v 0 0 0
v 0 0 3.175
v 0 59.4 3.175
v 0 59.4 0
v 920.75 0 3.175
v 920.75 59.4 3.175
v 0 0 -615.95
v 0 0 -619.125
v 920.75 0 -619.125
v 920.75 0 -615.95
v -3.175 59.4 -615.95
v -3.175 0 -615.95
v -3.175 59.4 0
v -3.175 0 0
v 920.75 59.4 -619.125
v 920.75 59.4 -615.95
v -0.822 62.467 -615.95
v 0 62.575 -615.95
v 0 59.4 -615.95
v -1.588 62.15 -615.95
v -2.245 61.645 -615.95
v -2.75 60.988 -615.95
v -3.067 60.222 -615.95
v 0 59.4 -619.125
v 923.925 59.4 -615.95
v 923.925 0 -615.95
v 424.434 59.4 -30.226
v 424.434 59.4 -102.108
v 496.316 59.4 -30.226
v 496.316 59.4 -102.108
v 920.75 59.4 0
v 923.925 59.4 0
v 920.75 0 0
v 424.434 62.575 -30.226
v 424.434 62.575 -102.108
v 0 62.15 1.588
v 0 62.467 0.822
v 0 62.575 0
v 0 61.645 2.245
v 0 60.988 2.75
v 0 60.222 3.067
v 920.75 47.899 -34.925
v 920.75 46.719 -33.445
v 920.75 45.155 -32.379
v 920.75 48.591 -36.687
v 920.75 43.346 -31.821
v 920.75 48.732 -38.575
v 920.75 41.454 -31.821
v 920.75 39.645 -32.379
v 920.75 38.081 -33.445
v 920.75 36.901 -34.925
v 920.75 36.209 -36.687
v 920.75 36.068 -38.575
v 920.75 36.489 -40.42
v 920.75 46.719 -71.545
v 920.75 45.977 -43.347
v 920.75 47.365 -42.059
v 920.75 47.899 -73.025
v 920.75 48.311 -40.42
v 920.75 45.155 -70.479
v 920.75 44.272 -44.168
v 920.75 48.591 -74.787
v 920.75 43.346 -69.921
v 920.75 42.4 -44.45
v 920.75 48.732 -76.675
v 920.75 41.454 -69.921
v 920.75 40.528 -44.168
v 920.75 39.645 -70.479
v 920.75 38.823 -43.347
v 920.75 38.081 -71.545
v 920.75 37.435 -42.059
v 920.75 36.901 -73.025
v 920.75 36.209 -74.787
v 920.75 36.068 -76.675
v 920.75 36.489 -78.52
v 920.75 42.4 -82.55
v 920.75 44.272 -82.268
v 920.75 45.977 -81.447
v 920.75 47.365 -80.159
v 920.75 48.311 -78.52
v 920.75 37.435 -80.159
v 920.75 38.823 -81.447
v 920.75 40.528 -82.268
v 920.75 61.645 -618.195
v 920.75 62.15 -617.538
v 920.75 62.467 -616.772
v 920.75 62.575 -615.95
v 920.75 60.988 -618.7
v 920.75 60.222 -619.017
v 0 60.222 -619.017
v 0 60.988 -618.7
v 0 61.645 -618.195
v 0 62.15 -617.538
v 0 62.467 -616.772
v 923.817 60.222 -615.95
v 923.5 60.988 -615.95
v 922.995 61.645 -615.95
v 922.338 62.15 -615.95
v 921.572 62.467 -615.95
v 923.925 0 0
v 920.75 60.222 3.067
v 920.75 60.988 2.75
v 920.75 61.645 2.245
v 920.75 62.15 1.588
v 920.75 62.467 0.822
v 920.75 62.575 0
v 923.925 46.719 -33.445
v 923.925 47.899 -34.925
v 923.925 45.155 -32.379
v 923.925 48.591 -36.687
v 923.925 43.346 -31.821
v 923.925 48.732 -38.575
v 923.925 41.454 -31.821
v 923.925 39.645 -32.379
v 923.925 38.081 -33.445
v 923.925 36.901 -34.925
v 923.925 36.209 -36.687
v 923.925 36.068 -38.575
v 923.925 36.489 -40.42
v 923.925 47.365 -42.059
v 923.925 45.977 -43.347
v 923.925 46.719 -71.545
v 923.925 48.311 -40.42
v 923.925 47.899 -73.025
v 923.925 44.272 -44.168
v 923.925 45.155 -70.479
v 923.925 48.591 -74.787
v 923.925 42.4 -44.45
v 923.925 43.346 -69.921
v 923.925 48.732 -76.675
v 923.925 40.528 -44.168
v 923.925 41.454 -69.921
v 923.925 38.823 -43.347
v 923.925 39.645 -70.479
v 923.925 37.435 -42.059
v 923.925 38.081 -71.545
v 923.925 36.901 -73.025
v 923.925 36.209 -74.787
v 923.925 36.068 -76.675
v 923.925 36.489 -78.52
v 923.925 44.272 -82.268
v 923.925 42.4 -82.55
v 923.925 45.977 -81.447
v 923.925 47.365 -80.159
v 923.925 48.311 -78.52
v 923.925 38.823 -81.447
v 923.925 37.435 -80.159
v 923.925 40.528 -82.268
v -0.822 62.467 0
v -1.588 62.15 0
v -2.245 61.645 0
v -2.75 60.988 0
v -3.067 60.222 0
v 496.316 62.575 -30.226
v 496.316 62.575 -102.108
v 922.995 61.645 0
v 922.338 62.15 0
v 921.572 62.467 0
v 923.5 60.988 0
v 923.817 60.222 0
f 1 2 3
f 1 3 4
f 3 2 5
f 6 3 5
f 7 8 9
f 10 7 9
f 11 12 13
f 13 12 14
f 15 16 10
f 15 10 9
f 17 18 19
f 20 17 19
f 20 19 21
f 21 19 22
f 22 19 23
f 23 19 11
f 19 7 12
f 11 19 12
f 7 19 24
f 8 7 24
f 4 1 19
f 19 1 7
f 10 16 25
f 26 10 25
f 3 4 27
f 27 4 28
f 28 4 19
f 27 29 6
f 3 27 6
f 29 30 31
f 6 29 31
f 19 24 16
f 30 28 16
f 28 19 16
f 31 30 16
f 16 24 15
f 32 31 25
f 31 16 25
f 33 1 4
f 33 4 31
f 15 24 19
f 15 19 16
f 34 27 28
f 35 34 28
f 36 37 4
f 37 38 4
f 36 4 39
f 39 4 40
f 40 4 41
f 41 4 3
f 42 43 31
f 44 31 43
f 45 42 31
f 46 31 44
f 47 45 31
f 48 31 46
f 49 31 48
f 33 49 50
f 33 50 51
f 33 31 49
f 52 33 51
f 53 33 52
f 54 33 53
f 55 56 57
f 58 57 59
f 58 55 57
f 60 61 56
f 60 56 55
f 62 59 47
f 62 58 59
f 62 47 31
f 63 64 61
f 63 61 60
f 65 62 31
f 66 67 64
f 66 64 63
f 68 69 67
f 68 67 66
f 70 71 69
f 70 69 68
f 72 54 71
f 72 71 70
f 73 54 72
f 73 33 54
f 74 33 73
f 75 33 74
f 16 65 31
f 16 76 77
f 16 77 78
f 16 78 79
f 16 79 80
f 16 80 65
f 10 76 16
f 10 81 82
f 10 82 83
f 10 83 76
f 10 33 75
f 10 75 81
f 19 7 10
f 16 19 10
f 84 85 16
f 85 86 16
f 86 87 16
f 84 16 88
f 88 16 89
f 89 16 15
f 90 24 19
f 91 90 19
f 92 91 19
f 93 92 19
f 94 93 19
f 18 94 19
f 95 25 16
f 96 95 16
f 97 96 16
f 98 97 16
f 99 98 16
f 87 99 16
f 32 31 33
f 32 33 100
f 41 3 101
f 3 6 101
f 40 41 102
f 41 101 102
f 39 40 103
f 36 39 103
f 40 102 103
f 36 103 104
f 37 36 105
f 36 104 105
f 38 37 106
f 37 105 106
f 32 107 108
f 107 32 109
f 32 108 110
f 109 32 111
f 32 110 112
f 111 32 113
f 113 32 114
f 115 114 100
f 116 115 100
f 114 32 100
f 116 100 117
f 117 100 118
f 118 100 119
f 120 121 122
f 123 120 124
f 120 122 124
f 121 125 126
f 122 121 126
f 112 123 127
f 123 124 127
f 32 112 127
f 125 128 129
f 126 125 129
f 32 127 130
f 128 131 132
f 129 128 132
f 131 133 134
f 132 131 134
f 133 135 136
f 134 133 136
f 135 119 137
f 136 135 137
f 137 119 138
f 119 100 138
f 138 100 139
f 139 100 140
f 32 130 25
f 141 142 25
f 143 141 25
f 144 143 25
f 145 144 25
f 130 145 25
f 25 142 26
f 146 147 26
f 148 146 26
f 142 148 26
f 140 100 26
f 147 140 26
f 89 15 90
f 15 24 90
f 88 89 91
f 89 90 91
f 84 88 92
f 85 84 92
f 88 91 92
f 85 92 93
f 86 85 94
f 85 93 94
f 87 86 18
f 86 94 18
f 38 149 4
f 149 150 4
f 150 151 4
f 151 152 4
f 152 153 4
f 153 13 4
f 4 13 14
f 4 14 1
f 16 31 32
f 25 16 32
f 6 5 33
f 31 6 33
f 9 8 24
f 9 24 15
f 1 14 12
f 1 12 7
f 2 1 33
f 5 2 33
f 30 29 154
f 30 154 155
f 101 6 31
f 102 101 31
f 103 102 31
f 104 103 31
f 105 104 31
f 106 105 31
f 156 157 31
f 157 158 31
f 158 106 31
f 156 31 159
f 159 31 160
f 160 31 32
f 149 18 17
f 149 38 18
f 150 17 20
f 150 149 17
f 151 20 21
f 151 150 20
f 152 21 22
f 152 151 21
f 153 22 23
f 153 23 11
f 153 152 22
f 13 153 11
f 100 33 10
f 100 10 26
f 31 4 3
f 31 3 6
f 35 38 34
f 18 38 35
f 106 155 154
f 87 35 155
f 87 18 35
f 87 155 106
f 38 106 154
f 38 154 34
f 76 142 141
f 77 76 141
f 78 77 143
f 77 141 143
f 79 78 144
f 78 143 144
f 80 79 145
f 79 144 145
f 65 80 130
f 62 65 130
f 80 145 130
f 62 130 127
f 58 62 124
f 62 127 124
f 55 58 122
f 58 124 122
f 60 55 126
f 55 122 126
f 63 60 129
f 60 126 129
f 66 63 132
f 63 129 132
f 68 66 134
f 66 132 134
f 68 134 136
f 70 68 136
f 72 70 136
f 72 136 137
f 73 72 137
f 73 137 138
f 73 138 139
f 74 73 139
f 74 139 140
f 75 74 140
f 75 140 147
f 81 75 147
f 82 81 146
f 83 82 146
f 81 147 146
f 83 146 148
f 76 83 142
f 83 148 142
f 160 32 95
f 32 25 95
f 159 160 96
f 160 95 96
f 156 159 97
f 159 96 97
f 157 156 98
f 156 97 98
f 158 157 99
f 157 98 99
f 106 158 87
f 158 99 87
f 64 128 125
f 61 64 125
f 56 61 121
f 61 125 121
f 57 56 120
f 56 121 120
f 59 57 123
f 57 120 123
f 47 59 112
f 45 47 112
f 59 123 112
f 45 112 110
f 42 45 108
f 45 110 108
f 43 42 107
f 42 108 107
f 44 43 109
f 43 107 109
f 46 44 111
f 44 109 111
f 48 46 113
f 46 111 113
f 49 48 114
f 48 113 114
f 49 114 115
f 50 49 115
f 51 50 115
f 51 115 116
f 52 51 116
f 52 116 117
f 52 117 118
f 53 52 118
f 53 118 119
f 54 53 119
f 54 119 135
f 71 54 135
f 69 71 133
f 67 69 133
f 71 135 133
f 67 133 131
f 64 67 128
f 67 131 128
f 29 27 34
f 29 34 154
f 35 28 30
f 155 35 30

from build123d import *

# Parameters (mm, degrees)
SKETCH1_W                 = 3.175
SKETCH1_H                 = 615.95
SKIRT_DEPTH               = 59.4
SKETCH1_W_2               = 920.75
SKETCH1_H_2               = 3.175
SKIRT_2_DEPTH             = 59.4
SKIRT_3_DEPTH             = 59.4
SKIRT_4_DEPTH             = 59.4
TOP_SURFACE_DEPTH         = 3.175
FILLET1_R                 = 3.175
SCALE_HOLE_DEPTH          = 1114.942907817
SCALE_HOLE_DEPTH_BACK     = 1114.942907817
SKETCH3_W                 = 71.882
SKETCH3_H                 = 71.882
SKETCH4_R                 = 6.35
TETHER_AND_AIR_HOLE_DEPTH = 3.175


with BuildPart() as part:
    # Sketch1 → Skirt (new body)
    with BuildSketch(Plane(origin=(0, 0, 0), x_dir=(1, 0, 0), z_dir=(0, 1, 0))):
        with Locations((-1.5875, 307.975)):
            Rectangle(SKETCH1_W, SKETCH1_H)
    extrude(amount=SKIRT_DEPTH)

    # Sketch2 → Top Surface (add)
    with BuildSketch(Plane(origin=(0, 59.4, 0), x_dir=(1, 0, 0), z_dir=(0, 1, 0))):
        Polygon((-3.175, 0), (0, 0), (0, -3.175), (920.75, -3.175), (920.75, 0), (923.925, 0), (923.925, 615.95), (920.75, 615.95), (920.75, 619.125), (0, 619.125), (0, 615.95), (-3.175, 615.95), align=None)
    extrude(amount=TOP_SURFACE_DEPTH)

    # Fillet1
    fillet1_edges = [part.edges().sort_by_distance(p)[0] for p in [
        (923.925, 62.575, -307.975),
        (460.375, 62.575, -619.125),
        (460.375, 62.575, 3.175),
        (-3.175, 62.575, -307.975),
    ]]
    fillet(fillet1_edges, radius=FILLET1_R - 0.0001)  # a hair under: the kernel refuses the full size

    # Sketch3 → Scale Hole (cut, two sides: drawn at the far end of the back side and taken through both)
    with BuildSketch(Plane(origin=(0, 62.575, 0), x_dir=(1, 0, 0), z_dir=(0, 1, 0)).offset(-SCALE_HOLE_DEPTH_BACK)):
        with Locations((460.375, 66.167)):
            Rectangle(SKETCH3_W, SKETCH3_H)
    extrude(amount=SCALE_HOLE_DEPTH + SCALE_HOLE_DEPTH_BACK, mode=Mode.SUBTRACT)


with BuildPart() as body_2:
    # Sketch1 → Skirt 2 (new body)
    with BuildSketch(Plane(origin=(0, 0, 0), x_dir=(1, 0, 0), z_dir=(0, 1, 0))):
        with Locations((460.375, -1.5875)):
            Rectangle(SKETCH1_W_2, SKETCH1_H_2)
    extrude(amount=SKIRT_2_DEPTH)


with BuildPart() as body_3:
    # Sketch1 → Skirt 3 (new body)
    with BuildSketch(Plane(origin=(0, 0, 0), x_dir=(1, 0, 0), z_dir=(0, 1, 0))):
        with Locations((460.375, 617.5375)):
            Rectangle(SKETCH1_W_2, SKETCH1_H_2)
    extrude(amount=SKIRT_3_DEPTH)


with BuildPart() as body_4:
    # Sketch1 → Skirt 4 (new body)
    with BuildSketch(Plane(origin=(0, 0, 0), x_dir=(1, 0, 0), z_dir=(0, 1, 0))):
        with Locations((922.3375, 307.975)):
            Rectangle(SKETCH1_W, SKETCH1_H)
    extrude(amount=SKIRT_4_DEPTH)

    # Sketch4 → Tether and Air Hole (cut)
    with BuildSketch(Plane(origin=(923.925, 0, 0), x_dir=(0, 0, -1), z_dir=(1, 0, 0))):
        with Locations((38.1, 42.4)):
            Circle(SKETCH4_R)
        with Locations((76.2, 42.4)):
            Circle(SKETCH4_R)
    extrude(amount=-TETHER_AND_AIR_HOLE_DEPTH, mode=Mode.SUBTRACT)


solid = Compound([part.part, body_2.part, body_3.part, body_4.part])
